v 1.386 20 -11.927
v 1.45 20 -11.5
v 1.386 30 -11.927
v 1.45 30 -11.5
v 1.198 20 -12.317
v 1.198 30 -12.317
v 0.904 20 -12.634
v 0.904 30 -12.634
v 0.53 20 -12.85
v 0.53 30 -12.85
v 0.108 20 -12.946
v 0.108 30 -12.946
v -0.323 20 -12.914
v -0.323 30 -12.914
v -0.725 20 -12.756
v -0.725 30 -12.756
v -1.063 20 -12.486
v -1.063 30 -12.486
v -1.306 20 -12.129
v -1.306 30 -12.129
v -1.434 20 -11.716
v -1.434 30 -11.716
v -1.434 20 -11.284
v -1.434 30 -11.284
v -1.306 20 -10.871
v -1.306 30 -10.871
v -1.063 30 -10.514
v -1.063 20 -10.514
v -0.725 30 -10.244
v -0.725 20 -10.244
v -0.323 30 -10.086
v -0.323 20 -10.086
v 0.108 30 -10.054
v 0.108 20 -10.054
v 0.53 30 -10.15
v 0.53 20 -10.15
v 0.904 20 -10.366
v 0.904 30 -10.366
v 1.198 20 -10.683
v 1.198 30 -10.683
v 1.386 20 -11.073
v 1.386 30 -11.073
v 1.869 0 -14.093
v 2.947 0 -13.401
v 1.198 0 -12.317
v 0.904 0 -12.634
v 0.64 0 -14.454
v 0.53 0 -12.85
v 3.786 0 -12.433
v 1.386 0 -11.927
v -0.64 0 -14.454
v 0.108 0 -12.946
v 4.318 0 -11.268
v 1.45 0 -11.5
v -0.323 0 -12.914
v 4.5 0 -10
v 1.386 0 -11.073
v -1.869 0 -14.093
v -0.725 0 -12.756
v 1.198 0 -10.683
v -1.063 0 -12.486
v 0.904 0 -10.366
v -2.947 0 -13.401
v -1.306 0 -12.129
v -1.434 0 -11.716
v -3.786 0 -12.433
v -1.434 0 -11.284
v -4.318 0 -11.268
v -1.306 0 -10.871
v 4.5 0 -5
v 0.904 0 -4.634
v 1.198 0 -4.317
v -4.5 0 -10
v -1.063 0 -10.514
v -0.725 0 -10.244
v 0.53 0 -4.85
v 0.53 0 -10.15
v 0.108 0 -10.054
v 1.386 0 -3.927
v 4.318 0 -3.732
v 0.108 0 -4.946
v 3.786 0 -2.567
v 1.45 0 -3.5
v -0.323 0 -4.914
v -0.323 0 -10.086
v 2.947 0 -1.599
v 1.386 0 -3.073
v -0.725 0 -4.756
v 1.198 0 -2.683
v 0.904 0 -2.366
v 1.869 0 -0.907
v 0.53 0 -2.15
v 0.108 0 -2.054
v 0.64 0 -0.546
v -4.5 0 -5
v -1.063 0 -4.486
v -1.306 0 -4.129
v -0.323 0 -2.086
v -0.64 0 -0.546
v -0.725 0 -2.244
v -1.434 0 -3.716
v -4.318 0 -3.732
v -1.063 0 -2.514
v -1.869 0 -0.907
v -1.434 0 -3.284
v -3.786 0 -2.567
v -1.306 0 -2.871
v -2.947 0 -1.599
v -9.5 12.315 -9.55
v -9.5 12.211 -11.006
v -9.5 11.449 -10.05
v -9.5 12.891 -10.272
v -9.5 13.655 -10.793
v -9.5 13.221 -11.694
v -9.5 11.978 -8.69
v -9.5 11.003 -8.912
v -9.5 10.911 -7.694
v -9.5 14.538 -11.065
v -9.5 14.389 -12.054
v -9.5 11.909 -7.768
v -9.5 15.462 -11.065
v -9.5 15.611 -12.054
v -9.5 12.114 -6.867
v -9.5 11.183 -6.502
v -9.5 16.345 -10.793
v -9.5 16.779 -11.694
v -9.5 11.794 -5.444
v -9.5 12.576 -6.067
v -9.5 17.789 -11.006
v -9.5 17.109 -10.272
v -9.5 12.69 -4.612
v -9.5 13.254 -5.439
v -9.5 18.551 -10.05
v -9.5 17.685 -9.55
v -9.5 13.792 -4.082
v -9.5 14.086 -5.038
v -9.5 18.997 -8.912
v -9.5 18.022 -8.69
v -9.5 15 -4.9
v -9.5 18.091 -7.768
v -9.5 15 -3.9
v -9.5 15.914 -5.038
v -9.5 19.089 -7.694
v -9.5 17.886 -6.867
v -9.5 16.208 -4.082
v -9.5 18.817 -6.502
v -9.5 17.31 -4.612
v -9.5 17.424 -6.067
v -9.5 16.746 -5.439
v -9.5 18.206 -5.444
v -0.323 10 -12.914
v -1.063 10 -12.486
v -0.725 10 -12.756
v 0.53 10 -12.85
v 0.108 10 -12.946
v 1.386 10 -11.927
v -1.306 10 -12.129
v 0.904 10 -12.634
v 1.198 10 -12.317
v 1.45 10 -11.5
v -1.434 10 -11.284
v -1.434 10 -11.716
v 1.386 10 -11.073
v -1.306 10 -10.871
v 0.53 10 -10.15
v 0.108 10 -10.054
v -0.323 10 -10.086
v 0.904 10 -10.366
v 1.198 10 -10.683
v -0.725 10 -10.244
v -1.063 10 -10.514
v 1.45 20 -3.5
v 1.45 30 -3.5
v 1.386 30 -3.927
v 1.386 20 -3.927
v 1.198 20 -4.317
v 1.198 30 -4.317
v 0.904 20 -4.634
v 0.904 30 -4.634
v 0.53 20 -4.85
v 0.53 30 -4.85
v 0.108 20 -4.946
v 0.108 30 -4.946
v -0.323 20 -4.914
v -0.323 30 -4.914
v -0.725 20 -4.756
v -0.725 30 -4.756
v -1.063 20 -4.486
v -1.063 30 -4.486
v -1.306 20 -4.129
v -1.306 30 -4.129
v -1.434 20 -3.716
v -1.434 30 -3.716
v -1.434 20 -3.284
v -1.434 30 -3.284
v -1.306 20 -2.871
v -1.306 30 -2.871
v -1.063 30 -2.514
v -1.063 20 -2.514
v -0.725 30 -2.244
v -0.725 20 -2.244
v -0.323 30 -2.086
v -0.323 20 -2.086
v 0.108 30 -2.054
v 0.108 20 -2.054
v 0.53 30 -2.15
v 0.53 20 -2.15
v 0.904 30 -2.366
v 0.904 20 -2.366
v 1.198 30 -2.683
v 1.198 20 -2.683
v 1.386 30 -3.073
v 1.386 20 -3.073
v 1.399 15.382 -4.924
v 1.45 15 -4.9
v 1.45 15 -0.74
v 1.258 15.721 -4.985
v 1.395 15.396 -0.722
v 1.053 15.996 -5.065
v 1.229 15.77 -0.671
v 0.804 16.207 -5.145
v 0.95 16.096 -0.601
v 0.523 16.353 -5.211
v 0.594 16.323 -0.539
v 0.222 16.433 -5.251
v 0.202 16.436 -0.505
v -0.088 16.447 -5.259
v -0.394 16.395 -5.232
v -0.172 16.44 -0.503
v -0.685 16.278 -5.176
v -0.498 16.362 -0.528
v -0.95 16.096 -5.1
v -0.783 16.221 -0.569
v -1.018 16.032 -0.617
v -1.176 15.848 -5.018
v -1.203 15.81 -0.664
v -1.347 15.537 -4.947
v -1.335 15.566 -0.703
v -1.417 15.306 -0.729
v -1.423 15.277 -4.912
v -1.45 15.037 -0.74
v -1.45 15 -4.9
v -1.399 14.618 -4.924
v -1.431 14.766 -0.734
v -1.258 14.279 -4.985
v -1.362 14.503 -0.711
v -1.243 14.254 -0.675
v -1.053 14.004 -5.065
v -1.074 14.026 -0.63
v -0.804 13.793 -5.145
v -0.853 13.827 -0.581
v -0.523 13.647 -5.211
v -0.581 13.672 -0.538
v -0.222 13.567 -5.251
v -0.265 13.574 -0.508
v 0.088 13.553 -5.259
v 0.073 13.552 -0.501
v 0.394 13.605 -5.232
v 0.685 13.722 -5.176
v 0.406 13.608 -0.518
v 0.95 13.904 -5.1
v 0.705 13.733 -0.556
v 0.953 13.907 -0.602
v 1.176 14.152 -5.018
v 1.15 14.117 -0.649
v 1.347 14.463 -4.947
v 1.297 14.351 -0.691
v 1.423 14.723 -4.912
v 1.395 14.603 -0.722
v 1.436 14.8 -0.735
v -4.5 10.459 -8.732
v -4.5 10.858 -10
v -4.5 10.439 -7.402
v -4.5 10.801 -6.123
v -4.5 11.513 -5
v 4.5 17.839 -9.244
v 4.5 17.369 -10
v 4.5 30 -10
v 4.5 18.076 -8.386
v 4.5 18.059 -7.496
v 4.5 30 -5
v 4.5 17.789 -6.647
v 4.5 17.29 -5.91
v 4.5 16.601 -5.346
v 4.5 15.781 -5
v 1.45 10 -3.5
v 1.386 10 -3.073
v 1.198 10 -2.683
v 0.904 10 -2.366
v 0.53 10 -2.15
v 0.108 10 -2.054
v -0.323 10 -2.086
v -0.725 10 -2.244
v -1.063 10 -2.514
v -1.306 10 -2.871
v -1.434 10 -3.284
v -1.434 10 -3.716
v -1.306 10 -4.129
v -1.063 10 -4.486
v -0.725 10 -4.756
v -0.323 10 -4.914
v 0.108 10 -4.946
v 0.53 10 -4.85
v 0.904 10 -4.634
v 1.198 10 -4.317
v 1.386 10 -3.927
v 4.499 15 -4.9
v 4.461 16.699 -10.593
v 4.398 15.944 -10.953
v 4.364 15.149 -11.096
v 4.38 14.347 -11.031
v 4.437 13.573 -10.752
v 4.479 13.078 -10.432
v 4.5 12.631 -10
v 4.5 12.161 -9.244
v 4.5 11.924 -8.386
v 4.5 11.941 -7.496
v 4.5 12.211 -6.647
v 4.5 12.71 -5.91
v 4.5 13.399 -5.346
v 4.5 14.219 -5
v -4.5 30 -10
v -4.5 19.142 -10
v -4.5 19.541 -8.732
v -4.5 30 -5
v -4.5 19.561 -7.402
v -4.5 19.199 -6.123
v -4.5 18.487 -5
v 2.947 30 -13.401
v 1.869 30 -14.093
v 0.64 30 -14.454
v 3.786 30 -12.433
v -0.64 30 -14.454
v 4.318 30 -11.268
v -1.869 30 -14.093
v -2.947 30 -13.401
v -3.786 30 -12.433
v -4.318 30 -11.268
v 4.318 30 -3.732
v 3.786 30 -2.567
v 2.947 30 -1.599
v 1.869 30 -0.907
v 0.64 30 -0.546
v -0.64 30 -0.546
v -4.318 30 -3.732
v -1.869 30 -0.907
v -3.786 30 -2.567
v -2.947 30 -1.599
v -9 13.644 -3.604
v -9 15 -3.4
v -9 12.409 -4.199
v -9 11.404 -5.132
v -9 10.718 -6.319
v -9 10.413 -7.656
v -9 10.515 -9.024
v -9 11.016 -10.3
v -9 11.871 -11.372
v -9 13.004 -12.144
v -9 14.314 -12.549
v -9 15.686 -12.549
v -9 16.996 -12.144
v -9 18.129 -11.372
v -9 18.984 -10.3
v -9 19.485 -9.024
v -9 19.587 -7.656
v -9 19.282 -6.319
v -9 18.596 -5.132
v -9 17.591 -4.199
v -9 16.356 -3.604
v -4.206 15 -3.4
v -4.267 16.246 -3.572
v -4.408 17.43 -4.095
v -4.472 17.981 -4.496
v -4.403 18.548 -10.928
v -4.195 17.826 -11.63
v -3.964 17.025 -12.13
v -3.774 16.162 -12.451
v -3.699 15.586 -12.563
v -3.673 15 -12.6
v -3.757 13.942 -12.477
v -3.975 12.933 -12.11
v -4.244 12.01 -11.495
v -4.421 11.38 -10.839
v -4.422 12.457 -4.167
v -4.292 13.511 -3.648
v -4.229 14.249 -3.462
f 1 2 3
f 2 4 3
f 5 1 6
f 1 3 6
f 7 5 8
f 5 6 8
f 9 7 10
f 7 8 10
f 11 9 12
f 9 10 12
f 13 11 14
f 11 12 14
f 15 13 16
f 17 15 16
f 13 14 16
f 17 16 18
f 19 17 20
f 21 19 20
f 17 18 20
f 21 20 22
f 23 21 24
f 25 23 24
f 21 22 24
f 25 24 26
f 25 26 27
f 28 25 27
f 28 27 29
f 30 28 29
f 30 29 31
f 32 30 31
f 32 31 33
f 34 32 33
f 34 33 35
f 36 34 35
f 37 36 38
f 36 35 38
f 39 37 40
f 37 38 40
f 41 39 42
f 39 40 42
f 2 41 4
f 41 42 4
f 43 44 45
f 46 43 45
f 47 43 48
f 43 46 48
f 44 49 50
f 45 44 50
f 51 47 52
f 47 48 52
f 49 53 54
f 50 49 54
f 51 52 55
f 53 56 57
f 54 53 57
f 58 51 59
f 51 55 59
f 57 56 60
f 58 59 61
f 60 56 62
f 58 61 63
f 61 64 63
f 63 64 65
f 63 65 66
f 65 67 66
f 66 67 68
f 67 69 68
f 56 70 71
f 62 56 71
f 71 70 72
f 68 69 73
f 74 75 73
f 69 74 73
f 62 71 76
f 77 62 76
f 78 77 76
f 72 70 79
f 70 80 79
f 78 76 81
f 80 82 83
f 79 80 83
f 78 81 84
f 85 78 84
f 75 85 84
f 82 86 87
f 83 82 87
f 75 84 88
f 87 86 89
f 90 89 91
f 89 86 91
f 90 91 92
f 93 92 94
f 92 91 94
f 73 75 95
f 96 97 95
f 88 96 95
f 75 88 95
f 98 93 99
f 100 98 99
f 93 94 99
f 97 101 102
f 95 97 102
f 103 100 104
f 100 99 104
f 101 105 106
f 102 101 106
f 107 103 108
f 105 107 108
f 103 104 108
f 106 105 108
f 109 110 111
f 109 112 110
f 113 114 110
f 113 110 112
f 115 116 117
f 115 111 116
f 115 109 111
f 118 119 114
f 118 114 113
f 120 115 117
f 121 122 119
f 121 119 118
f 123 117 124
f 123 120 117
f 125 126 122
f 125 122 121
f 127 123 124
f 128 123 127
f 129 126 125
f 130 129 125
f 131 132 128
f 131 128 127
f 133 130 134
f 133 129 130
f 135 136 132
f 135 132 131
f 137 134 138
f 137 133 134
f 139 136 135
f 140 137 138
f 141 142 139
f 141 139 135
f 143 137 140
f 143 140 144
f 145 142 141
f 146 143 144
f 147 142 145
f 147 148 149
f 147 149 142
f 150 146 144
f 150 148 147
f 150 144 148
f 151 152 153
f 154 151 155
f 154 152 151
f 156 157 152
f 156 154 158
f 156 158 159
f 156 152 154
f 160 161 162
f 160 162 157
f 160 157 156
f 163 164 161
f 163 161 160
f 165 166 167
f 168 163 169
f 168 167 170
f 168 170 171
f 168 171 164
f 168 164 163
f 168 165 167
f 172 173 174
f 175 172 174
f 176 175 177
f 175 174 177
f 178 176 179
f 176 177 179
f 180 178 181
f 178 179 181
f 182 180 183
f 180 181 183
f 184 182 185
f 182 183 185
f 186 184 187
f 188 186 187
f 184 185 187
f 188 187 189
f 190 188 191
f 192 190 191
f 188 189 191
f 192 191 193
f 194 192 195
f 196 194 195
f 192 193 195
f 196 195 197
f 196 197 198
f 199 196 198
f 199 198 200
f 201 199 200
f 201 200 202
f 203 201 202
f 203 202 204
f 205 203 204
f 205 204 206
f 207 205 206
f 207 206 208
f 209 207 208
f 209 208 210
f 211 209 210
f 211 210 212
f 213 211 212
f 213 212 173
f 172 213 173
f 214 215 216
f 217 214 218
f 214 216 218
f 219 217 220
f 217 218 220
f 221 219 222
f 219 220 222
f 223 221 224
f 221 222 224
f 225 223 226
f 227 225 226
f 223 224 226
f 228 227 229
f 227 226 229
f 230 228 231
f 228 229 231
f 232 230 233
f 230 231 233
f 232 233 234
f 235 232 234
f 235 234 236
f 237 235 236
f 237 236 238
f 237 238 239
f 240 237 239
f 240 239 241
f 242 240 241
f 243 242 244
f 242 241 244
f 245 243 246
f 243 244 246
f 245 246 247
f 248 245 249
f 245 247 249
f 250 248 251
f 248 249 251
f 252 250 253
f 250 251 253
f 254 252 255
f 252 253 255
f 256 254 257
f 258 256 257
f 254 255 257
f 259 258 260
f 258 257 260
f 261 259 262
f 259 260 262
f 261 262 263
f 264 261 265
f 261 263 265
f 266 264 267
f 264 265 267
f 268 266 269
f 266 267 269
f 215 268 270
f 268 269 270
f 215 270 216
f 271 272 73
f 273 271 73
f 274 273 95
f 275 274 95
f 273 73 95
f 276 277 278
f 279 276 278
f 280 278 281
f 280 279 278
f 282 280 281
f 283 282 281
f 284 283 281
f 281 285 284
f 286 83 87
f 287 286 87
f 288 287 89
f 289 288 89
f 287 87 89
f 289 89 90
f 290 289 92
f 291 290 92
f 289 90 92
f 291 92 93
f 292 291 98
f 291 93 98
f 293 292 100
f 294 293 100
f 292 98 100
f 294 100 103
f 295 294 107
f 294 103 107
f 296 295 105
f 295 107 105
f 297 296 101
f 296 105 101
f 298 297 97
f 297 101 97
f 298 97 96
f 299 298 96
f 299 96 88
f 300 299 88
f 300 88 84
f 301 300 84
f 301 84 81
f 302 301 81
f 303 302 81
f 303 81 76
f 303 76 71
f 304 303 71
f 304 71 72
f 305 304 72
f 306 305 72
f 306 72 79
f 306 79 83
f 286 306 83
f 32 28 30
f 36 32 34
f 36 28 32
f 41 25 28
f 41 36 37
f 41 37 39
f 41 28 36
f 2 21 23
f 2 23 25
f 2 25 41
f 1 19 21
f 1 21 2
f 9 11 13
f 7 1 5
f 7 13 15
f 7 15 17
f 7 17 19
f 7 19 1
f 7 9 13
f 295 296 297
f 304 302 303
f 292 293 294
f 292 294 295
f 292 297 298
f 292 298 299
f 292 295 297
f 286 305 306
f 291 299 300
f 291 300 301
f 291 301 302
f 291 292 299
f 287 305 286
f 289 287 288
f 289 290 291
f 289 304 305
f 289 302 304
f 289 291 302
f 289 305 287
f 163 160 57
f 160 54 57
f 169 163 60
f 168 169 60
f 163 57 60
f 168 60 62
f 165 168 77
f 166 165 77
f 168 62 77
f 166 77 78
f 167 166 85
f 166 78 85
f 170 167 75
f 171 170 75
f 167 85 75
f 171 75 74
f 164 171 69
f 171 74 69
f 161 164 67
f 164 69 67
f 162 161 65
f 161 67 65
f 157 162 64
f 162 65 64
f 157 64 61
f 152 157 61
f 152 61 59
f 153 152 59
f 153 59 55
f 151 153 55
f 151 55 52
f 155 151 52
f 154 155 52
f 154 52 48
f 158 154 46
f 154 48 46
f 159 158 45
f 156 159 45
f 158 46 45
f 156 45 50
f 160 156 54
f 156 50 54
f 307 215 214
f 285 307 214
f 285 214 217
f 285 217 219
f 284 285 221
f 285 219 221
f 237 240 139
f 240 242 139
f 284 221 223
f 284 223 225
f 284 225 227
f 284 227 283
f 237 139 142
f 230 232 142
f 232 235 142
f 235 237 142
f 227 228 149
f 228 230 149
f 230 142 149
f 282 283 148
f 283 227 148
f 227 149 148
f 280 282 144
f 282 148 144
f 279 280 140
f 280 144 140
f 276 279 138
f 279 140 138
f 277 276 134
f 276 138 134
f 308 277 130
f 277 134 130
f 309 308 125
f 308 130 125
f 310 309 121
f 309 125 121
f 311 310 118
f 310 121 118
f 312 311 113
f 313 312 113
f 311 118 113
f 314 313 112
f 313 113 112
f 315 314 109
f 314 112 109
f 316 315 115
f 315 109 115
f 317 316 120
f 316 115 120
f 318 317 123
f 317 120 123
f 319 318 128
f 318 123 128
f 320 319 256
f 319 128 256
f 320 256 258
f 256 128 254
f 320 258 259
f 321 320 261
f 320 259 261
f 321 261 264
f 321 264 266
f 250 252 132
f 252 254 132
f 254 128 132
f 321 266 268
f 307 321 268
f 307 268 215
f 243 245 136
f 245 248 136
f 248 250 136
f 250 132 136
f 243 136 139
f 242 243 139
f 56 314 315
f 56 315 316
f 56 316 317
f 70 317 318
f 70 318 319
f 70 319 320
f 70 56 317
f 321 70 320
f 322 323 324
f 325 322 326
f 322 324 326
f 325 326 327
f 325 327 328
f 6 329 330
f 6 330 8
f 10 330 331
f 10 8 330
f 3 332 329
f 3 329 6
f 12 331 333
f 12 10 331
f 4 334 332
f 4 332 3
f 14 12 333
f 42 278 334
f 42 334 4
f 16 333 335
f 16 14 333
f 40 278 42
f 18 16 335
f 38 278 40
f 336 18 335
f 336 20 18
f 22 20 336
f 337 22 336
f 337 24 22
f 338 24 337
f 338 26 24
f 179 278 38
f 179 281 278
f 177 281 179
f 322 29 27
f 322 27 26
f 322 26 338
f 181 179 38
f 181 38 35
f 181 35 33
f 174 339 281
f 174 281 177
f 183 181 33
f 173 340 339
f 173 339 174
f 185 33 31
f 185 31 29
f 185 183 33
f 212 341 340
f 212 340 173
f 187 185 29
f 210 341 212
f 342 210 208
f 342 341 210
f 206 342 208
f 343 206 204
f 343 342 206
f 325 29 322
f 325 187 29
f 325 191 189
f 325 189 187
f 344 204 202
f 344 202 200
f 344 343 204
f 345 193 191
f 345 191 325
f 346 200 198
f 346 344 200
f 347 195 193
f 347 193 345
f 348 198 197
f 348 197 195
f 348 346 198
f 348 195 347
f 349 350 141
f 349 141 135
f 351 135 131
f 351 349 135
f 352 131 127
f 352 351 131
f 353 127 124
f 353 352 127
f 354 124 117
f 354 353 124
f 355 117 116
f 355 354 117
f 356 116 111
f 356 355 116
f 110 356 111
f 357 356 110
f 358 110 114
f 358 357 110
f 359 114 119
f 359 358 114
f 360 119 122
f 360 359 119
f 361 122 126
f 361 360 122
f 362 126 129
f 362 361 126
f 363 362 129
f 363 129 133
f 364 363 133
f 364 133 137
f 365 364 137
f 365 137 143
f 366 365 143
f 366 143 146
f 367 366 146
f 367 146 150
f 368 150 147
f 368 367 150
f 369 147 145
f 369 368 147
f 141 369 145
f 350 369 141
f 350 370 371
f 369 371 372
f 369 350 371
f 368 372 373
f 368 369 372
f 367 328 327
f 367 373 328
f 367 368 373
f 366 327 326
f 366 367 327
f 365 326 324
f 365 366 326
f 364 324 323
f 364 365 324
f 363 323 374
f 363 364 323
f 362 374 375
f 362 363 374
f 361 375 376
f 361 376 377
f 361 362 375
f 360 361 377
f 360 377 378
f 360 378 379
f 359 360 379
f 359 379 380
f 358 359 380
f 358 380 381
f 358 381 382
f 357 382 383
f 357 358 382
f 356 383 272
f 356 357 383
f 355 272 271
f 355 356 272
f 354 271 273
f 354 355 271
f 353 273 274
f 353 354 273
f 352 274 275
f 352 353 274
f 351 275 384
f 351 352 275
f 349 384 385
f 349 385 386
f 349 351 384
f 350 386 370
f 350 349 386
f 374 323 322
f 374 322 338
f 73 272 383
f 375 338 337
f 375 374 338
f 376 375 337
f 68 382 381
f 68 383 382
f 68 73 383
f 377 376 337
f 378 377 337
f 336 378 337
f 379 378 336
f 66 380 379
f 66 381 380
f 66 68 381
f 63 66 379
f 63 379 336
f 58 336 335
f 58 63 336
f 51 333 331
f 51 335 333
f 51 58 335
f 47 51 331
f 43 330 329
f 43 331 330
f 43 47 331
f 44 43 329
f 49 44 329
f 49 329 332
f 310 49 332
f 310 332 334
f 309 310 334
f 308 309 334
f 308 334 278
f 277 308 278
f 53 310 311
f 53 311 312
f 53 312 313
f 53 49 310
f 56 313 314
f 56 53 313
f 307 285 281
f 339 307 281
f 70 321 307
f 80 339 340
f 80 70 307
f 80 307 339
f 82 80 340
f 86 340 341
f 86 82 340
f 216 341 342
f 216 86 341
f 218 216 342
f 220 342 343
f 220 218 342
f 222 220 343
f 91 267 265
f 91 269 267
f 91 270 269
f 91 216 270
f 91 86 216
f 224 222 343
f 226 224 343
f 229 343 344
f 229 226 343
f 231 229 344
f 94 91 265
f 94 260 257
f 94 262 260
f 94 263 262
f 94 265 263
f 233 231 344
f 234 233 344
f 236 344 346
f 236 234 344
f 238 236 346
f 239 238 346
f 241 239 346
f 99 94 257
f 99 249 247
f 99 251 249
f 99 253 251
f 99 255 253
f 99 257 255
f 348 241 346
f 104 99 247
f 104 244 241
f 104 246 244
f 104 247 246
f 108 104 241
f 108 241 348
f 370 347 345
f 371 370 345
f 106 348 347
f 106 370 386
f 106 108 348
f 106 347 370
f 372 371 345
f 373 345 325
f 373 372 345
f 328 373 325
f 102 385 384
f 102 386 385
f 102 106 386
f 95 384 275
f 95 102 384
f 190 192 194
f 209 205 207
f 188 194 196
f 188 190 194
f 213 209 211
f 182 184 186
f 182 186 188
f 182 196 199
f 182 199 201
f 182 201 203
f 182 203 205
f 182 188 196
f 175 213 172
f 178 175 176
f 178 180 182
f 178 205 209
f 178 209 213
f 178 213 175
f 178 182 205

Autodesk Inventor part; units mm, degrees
ref_plane "YZ Plane" through (0, 0, 0) normal (1, 0, 0) x (0, 1, 0)
ref_plane "XZ Plane" through (0, 0, 0) normal (0, 1, 0) x (-1, 0, 0)
sketch "Sketch2" plane through (0, 0, 0) normal (0, 1, 0) x (-1, 0, 0)
  line L0 (-4.5, -10) -> (-4.5, -5)
  line L1 (4.5, -10) -> (4.5, -5)
  arc A0 (4.5, -5) -> (-4.5, -5) centre (0, -5) ccw
  arc A1 (-4.5, -10) -> (4.5, -10) centre (0, -10) ccw
  point P0 (0, 0)
  point P1 (0.9888, -13.1808)
  dimension "d75" = 5
  dimension "d76" = 5
extrude "Extrusion1" add sketch "Sketch2" along normal blind 30
sketch "Sketch14" plane through (-4.5, 0, -10) normal (-1, 0, 0) x (0, 0, 1)
  line L0 (-4.5, 0) -> (-4.5, 30) projected
  line L1 (-4.5, 0) -> (-4.5, 15)
  line L2 (-4.5, 15) -> (2, 15)
  circle A0 centre (2, 15) radius 3.1
  circle A1 centre (2, 15) radius 4.6
  point P0 (10, 0)
  point P1 (-11.5, 30)
  dimension "d80" = 15
  dimension "d81" = 6.5
  dimension "d82" = 6.2
  dimension "d83" = 9.2
extrude "Extrusion13" add sketch "Sketch14" along normal blind 5 and the other way blind 5
chamfer "Chamfer4" distance 0.5 angle 45 1 edges at (-9.5, 15, -12.6)
sketch "Sketch15" plane through (-4.5, 15, -8) normal (-1, 0, 0) x (0, 0, 1)
  circle A0 centre (0, 0) radius 3.1 projected
  point P0 (8, -15)
extrude "Extrusion14" cut sketch "Sketch15" against normal through all
sketch "Sketch18" plane through (0, 30, 0) normal (0, 1, 0) x (1, 0, 0)
  arc A0 (4.5, 10) -> (-4.5, 10) centre (0, 10) ccw projected
  line L0 (0, 14.5) -> (0, 11.5)
  circle A1 centre (0, 11.5) radius 1.45
  arc A2 (-4.5, 5) -> (4.5, 5) centre (0, 5) ccw projected
  line L1 (0, 0.5) -> (0, 3.5)
  circle A3 centre (0, 3.5) radius 1.45
  point P0 (0, 0)
  dimension "d103" = 3
  dimension "d104" = 2.9
  dimension "d105" = 3
  dimension "d106" = 2.9
extrude "Extrusion17" cut sketch "Sketch18" against normal blind 10
sketch "Sketch19" plane through (0, 0, 0) normal (0, -1, 0) x (1, 0, 0)
  line L0 (4.5, -10) -> (4.5, -5) projected
  arc A0 (4.5, -5) -> (-4.5, -5) centre (0, -5) ccw projected
  line L1 (-4.5, -5) -> (-4.5, -10) projected
  arc A1 (-4.5, -10) -> (4.5, -10) centre (0, -10) ccw projected
  circle A2 centre (0, -11.5) radius 1.45 projected
  circle A3 centre (0, -3.5) radius 1.45 projected
extrude "Extrusion18" cut sketch "Sketch19" against normal blind 10 contours A2 | A3
ref_plane "Work Plane9" through (0, 0, -0.5) normal (0, 0, 1) x (1, 0, 0)
sketch "Sketch20" plane through (0, 0, 0) normal (0, 0, 1) x (1, 0, 0)
  circle A0 centre (0, 15) radius 1.45
  point P0 (0, 0)
  dimension "d115" = 2.9
extrude "Extrusion19" cut sketch "Sketch20" against normal up to next
thread "Thread1" size "M3x0.5" class "6H" standard "ANSI Metric M Profile" full length
properties part number "Front mount" material "ABS Plastic"
